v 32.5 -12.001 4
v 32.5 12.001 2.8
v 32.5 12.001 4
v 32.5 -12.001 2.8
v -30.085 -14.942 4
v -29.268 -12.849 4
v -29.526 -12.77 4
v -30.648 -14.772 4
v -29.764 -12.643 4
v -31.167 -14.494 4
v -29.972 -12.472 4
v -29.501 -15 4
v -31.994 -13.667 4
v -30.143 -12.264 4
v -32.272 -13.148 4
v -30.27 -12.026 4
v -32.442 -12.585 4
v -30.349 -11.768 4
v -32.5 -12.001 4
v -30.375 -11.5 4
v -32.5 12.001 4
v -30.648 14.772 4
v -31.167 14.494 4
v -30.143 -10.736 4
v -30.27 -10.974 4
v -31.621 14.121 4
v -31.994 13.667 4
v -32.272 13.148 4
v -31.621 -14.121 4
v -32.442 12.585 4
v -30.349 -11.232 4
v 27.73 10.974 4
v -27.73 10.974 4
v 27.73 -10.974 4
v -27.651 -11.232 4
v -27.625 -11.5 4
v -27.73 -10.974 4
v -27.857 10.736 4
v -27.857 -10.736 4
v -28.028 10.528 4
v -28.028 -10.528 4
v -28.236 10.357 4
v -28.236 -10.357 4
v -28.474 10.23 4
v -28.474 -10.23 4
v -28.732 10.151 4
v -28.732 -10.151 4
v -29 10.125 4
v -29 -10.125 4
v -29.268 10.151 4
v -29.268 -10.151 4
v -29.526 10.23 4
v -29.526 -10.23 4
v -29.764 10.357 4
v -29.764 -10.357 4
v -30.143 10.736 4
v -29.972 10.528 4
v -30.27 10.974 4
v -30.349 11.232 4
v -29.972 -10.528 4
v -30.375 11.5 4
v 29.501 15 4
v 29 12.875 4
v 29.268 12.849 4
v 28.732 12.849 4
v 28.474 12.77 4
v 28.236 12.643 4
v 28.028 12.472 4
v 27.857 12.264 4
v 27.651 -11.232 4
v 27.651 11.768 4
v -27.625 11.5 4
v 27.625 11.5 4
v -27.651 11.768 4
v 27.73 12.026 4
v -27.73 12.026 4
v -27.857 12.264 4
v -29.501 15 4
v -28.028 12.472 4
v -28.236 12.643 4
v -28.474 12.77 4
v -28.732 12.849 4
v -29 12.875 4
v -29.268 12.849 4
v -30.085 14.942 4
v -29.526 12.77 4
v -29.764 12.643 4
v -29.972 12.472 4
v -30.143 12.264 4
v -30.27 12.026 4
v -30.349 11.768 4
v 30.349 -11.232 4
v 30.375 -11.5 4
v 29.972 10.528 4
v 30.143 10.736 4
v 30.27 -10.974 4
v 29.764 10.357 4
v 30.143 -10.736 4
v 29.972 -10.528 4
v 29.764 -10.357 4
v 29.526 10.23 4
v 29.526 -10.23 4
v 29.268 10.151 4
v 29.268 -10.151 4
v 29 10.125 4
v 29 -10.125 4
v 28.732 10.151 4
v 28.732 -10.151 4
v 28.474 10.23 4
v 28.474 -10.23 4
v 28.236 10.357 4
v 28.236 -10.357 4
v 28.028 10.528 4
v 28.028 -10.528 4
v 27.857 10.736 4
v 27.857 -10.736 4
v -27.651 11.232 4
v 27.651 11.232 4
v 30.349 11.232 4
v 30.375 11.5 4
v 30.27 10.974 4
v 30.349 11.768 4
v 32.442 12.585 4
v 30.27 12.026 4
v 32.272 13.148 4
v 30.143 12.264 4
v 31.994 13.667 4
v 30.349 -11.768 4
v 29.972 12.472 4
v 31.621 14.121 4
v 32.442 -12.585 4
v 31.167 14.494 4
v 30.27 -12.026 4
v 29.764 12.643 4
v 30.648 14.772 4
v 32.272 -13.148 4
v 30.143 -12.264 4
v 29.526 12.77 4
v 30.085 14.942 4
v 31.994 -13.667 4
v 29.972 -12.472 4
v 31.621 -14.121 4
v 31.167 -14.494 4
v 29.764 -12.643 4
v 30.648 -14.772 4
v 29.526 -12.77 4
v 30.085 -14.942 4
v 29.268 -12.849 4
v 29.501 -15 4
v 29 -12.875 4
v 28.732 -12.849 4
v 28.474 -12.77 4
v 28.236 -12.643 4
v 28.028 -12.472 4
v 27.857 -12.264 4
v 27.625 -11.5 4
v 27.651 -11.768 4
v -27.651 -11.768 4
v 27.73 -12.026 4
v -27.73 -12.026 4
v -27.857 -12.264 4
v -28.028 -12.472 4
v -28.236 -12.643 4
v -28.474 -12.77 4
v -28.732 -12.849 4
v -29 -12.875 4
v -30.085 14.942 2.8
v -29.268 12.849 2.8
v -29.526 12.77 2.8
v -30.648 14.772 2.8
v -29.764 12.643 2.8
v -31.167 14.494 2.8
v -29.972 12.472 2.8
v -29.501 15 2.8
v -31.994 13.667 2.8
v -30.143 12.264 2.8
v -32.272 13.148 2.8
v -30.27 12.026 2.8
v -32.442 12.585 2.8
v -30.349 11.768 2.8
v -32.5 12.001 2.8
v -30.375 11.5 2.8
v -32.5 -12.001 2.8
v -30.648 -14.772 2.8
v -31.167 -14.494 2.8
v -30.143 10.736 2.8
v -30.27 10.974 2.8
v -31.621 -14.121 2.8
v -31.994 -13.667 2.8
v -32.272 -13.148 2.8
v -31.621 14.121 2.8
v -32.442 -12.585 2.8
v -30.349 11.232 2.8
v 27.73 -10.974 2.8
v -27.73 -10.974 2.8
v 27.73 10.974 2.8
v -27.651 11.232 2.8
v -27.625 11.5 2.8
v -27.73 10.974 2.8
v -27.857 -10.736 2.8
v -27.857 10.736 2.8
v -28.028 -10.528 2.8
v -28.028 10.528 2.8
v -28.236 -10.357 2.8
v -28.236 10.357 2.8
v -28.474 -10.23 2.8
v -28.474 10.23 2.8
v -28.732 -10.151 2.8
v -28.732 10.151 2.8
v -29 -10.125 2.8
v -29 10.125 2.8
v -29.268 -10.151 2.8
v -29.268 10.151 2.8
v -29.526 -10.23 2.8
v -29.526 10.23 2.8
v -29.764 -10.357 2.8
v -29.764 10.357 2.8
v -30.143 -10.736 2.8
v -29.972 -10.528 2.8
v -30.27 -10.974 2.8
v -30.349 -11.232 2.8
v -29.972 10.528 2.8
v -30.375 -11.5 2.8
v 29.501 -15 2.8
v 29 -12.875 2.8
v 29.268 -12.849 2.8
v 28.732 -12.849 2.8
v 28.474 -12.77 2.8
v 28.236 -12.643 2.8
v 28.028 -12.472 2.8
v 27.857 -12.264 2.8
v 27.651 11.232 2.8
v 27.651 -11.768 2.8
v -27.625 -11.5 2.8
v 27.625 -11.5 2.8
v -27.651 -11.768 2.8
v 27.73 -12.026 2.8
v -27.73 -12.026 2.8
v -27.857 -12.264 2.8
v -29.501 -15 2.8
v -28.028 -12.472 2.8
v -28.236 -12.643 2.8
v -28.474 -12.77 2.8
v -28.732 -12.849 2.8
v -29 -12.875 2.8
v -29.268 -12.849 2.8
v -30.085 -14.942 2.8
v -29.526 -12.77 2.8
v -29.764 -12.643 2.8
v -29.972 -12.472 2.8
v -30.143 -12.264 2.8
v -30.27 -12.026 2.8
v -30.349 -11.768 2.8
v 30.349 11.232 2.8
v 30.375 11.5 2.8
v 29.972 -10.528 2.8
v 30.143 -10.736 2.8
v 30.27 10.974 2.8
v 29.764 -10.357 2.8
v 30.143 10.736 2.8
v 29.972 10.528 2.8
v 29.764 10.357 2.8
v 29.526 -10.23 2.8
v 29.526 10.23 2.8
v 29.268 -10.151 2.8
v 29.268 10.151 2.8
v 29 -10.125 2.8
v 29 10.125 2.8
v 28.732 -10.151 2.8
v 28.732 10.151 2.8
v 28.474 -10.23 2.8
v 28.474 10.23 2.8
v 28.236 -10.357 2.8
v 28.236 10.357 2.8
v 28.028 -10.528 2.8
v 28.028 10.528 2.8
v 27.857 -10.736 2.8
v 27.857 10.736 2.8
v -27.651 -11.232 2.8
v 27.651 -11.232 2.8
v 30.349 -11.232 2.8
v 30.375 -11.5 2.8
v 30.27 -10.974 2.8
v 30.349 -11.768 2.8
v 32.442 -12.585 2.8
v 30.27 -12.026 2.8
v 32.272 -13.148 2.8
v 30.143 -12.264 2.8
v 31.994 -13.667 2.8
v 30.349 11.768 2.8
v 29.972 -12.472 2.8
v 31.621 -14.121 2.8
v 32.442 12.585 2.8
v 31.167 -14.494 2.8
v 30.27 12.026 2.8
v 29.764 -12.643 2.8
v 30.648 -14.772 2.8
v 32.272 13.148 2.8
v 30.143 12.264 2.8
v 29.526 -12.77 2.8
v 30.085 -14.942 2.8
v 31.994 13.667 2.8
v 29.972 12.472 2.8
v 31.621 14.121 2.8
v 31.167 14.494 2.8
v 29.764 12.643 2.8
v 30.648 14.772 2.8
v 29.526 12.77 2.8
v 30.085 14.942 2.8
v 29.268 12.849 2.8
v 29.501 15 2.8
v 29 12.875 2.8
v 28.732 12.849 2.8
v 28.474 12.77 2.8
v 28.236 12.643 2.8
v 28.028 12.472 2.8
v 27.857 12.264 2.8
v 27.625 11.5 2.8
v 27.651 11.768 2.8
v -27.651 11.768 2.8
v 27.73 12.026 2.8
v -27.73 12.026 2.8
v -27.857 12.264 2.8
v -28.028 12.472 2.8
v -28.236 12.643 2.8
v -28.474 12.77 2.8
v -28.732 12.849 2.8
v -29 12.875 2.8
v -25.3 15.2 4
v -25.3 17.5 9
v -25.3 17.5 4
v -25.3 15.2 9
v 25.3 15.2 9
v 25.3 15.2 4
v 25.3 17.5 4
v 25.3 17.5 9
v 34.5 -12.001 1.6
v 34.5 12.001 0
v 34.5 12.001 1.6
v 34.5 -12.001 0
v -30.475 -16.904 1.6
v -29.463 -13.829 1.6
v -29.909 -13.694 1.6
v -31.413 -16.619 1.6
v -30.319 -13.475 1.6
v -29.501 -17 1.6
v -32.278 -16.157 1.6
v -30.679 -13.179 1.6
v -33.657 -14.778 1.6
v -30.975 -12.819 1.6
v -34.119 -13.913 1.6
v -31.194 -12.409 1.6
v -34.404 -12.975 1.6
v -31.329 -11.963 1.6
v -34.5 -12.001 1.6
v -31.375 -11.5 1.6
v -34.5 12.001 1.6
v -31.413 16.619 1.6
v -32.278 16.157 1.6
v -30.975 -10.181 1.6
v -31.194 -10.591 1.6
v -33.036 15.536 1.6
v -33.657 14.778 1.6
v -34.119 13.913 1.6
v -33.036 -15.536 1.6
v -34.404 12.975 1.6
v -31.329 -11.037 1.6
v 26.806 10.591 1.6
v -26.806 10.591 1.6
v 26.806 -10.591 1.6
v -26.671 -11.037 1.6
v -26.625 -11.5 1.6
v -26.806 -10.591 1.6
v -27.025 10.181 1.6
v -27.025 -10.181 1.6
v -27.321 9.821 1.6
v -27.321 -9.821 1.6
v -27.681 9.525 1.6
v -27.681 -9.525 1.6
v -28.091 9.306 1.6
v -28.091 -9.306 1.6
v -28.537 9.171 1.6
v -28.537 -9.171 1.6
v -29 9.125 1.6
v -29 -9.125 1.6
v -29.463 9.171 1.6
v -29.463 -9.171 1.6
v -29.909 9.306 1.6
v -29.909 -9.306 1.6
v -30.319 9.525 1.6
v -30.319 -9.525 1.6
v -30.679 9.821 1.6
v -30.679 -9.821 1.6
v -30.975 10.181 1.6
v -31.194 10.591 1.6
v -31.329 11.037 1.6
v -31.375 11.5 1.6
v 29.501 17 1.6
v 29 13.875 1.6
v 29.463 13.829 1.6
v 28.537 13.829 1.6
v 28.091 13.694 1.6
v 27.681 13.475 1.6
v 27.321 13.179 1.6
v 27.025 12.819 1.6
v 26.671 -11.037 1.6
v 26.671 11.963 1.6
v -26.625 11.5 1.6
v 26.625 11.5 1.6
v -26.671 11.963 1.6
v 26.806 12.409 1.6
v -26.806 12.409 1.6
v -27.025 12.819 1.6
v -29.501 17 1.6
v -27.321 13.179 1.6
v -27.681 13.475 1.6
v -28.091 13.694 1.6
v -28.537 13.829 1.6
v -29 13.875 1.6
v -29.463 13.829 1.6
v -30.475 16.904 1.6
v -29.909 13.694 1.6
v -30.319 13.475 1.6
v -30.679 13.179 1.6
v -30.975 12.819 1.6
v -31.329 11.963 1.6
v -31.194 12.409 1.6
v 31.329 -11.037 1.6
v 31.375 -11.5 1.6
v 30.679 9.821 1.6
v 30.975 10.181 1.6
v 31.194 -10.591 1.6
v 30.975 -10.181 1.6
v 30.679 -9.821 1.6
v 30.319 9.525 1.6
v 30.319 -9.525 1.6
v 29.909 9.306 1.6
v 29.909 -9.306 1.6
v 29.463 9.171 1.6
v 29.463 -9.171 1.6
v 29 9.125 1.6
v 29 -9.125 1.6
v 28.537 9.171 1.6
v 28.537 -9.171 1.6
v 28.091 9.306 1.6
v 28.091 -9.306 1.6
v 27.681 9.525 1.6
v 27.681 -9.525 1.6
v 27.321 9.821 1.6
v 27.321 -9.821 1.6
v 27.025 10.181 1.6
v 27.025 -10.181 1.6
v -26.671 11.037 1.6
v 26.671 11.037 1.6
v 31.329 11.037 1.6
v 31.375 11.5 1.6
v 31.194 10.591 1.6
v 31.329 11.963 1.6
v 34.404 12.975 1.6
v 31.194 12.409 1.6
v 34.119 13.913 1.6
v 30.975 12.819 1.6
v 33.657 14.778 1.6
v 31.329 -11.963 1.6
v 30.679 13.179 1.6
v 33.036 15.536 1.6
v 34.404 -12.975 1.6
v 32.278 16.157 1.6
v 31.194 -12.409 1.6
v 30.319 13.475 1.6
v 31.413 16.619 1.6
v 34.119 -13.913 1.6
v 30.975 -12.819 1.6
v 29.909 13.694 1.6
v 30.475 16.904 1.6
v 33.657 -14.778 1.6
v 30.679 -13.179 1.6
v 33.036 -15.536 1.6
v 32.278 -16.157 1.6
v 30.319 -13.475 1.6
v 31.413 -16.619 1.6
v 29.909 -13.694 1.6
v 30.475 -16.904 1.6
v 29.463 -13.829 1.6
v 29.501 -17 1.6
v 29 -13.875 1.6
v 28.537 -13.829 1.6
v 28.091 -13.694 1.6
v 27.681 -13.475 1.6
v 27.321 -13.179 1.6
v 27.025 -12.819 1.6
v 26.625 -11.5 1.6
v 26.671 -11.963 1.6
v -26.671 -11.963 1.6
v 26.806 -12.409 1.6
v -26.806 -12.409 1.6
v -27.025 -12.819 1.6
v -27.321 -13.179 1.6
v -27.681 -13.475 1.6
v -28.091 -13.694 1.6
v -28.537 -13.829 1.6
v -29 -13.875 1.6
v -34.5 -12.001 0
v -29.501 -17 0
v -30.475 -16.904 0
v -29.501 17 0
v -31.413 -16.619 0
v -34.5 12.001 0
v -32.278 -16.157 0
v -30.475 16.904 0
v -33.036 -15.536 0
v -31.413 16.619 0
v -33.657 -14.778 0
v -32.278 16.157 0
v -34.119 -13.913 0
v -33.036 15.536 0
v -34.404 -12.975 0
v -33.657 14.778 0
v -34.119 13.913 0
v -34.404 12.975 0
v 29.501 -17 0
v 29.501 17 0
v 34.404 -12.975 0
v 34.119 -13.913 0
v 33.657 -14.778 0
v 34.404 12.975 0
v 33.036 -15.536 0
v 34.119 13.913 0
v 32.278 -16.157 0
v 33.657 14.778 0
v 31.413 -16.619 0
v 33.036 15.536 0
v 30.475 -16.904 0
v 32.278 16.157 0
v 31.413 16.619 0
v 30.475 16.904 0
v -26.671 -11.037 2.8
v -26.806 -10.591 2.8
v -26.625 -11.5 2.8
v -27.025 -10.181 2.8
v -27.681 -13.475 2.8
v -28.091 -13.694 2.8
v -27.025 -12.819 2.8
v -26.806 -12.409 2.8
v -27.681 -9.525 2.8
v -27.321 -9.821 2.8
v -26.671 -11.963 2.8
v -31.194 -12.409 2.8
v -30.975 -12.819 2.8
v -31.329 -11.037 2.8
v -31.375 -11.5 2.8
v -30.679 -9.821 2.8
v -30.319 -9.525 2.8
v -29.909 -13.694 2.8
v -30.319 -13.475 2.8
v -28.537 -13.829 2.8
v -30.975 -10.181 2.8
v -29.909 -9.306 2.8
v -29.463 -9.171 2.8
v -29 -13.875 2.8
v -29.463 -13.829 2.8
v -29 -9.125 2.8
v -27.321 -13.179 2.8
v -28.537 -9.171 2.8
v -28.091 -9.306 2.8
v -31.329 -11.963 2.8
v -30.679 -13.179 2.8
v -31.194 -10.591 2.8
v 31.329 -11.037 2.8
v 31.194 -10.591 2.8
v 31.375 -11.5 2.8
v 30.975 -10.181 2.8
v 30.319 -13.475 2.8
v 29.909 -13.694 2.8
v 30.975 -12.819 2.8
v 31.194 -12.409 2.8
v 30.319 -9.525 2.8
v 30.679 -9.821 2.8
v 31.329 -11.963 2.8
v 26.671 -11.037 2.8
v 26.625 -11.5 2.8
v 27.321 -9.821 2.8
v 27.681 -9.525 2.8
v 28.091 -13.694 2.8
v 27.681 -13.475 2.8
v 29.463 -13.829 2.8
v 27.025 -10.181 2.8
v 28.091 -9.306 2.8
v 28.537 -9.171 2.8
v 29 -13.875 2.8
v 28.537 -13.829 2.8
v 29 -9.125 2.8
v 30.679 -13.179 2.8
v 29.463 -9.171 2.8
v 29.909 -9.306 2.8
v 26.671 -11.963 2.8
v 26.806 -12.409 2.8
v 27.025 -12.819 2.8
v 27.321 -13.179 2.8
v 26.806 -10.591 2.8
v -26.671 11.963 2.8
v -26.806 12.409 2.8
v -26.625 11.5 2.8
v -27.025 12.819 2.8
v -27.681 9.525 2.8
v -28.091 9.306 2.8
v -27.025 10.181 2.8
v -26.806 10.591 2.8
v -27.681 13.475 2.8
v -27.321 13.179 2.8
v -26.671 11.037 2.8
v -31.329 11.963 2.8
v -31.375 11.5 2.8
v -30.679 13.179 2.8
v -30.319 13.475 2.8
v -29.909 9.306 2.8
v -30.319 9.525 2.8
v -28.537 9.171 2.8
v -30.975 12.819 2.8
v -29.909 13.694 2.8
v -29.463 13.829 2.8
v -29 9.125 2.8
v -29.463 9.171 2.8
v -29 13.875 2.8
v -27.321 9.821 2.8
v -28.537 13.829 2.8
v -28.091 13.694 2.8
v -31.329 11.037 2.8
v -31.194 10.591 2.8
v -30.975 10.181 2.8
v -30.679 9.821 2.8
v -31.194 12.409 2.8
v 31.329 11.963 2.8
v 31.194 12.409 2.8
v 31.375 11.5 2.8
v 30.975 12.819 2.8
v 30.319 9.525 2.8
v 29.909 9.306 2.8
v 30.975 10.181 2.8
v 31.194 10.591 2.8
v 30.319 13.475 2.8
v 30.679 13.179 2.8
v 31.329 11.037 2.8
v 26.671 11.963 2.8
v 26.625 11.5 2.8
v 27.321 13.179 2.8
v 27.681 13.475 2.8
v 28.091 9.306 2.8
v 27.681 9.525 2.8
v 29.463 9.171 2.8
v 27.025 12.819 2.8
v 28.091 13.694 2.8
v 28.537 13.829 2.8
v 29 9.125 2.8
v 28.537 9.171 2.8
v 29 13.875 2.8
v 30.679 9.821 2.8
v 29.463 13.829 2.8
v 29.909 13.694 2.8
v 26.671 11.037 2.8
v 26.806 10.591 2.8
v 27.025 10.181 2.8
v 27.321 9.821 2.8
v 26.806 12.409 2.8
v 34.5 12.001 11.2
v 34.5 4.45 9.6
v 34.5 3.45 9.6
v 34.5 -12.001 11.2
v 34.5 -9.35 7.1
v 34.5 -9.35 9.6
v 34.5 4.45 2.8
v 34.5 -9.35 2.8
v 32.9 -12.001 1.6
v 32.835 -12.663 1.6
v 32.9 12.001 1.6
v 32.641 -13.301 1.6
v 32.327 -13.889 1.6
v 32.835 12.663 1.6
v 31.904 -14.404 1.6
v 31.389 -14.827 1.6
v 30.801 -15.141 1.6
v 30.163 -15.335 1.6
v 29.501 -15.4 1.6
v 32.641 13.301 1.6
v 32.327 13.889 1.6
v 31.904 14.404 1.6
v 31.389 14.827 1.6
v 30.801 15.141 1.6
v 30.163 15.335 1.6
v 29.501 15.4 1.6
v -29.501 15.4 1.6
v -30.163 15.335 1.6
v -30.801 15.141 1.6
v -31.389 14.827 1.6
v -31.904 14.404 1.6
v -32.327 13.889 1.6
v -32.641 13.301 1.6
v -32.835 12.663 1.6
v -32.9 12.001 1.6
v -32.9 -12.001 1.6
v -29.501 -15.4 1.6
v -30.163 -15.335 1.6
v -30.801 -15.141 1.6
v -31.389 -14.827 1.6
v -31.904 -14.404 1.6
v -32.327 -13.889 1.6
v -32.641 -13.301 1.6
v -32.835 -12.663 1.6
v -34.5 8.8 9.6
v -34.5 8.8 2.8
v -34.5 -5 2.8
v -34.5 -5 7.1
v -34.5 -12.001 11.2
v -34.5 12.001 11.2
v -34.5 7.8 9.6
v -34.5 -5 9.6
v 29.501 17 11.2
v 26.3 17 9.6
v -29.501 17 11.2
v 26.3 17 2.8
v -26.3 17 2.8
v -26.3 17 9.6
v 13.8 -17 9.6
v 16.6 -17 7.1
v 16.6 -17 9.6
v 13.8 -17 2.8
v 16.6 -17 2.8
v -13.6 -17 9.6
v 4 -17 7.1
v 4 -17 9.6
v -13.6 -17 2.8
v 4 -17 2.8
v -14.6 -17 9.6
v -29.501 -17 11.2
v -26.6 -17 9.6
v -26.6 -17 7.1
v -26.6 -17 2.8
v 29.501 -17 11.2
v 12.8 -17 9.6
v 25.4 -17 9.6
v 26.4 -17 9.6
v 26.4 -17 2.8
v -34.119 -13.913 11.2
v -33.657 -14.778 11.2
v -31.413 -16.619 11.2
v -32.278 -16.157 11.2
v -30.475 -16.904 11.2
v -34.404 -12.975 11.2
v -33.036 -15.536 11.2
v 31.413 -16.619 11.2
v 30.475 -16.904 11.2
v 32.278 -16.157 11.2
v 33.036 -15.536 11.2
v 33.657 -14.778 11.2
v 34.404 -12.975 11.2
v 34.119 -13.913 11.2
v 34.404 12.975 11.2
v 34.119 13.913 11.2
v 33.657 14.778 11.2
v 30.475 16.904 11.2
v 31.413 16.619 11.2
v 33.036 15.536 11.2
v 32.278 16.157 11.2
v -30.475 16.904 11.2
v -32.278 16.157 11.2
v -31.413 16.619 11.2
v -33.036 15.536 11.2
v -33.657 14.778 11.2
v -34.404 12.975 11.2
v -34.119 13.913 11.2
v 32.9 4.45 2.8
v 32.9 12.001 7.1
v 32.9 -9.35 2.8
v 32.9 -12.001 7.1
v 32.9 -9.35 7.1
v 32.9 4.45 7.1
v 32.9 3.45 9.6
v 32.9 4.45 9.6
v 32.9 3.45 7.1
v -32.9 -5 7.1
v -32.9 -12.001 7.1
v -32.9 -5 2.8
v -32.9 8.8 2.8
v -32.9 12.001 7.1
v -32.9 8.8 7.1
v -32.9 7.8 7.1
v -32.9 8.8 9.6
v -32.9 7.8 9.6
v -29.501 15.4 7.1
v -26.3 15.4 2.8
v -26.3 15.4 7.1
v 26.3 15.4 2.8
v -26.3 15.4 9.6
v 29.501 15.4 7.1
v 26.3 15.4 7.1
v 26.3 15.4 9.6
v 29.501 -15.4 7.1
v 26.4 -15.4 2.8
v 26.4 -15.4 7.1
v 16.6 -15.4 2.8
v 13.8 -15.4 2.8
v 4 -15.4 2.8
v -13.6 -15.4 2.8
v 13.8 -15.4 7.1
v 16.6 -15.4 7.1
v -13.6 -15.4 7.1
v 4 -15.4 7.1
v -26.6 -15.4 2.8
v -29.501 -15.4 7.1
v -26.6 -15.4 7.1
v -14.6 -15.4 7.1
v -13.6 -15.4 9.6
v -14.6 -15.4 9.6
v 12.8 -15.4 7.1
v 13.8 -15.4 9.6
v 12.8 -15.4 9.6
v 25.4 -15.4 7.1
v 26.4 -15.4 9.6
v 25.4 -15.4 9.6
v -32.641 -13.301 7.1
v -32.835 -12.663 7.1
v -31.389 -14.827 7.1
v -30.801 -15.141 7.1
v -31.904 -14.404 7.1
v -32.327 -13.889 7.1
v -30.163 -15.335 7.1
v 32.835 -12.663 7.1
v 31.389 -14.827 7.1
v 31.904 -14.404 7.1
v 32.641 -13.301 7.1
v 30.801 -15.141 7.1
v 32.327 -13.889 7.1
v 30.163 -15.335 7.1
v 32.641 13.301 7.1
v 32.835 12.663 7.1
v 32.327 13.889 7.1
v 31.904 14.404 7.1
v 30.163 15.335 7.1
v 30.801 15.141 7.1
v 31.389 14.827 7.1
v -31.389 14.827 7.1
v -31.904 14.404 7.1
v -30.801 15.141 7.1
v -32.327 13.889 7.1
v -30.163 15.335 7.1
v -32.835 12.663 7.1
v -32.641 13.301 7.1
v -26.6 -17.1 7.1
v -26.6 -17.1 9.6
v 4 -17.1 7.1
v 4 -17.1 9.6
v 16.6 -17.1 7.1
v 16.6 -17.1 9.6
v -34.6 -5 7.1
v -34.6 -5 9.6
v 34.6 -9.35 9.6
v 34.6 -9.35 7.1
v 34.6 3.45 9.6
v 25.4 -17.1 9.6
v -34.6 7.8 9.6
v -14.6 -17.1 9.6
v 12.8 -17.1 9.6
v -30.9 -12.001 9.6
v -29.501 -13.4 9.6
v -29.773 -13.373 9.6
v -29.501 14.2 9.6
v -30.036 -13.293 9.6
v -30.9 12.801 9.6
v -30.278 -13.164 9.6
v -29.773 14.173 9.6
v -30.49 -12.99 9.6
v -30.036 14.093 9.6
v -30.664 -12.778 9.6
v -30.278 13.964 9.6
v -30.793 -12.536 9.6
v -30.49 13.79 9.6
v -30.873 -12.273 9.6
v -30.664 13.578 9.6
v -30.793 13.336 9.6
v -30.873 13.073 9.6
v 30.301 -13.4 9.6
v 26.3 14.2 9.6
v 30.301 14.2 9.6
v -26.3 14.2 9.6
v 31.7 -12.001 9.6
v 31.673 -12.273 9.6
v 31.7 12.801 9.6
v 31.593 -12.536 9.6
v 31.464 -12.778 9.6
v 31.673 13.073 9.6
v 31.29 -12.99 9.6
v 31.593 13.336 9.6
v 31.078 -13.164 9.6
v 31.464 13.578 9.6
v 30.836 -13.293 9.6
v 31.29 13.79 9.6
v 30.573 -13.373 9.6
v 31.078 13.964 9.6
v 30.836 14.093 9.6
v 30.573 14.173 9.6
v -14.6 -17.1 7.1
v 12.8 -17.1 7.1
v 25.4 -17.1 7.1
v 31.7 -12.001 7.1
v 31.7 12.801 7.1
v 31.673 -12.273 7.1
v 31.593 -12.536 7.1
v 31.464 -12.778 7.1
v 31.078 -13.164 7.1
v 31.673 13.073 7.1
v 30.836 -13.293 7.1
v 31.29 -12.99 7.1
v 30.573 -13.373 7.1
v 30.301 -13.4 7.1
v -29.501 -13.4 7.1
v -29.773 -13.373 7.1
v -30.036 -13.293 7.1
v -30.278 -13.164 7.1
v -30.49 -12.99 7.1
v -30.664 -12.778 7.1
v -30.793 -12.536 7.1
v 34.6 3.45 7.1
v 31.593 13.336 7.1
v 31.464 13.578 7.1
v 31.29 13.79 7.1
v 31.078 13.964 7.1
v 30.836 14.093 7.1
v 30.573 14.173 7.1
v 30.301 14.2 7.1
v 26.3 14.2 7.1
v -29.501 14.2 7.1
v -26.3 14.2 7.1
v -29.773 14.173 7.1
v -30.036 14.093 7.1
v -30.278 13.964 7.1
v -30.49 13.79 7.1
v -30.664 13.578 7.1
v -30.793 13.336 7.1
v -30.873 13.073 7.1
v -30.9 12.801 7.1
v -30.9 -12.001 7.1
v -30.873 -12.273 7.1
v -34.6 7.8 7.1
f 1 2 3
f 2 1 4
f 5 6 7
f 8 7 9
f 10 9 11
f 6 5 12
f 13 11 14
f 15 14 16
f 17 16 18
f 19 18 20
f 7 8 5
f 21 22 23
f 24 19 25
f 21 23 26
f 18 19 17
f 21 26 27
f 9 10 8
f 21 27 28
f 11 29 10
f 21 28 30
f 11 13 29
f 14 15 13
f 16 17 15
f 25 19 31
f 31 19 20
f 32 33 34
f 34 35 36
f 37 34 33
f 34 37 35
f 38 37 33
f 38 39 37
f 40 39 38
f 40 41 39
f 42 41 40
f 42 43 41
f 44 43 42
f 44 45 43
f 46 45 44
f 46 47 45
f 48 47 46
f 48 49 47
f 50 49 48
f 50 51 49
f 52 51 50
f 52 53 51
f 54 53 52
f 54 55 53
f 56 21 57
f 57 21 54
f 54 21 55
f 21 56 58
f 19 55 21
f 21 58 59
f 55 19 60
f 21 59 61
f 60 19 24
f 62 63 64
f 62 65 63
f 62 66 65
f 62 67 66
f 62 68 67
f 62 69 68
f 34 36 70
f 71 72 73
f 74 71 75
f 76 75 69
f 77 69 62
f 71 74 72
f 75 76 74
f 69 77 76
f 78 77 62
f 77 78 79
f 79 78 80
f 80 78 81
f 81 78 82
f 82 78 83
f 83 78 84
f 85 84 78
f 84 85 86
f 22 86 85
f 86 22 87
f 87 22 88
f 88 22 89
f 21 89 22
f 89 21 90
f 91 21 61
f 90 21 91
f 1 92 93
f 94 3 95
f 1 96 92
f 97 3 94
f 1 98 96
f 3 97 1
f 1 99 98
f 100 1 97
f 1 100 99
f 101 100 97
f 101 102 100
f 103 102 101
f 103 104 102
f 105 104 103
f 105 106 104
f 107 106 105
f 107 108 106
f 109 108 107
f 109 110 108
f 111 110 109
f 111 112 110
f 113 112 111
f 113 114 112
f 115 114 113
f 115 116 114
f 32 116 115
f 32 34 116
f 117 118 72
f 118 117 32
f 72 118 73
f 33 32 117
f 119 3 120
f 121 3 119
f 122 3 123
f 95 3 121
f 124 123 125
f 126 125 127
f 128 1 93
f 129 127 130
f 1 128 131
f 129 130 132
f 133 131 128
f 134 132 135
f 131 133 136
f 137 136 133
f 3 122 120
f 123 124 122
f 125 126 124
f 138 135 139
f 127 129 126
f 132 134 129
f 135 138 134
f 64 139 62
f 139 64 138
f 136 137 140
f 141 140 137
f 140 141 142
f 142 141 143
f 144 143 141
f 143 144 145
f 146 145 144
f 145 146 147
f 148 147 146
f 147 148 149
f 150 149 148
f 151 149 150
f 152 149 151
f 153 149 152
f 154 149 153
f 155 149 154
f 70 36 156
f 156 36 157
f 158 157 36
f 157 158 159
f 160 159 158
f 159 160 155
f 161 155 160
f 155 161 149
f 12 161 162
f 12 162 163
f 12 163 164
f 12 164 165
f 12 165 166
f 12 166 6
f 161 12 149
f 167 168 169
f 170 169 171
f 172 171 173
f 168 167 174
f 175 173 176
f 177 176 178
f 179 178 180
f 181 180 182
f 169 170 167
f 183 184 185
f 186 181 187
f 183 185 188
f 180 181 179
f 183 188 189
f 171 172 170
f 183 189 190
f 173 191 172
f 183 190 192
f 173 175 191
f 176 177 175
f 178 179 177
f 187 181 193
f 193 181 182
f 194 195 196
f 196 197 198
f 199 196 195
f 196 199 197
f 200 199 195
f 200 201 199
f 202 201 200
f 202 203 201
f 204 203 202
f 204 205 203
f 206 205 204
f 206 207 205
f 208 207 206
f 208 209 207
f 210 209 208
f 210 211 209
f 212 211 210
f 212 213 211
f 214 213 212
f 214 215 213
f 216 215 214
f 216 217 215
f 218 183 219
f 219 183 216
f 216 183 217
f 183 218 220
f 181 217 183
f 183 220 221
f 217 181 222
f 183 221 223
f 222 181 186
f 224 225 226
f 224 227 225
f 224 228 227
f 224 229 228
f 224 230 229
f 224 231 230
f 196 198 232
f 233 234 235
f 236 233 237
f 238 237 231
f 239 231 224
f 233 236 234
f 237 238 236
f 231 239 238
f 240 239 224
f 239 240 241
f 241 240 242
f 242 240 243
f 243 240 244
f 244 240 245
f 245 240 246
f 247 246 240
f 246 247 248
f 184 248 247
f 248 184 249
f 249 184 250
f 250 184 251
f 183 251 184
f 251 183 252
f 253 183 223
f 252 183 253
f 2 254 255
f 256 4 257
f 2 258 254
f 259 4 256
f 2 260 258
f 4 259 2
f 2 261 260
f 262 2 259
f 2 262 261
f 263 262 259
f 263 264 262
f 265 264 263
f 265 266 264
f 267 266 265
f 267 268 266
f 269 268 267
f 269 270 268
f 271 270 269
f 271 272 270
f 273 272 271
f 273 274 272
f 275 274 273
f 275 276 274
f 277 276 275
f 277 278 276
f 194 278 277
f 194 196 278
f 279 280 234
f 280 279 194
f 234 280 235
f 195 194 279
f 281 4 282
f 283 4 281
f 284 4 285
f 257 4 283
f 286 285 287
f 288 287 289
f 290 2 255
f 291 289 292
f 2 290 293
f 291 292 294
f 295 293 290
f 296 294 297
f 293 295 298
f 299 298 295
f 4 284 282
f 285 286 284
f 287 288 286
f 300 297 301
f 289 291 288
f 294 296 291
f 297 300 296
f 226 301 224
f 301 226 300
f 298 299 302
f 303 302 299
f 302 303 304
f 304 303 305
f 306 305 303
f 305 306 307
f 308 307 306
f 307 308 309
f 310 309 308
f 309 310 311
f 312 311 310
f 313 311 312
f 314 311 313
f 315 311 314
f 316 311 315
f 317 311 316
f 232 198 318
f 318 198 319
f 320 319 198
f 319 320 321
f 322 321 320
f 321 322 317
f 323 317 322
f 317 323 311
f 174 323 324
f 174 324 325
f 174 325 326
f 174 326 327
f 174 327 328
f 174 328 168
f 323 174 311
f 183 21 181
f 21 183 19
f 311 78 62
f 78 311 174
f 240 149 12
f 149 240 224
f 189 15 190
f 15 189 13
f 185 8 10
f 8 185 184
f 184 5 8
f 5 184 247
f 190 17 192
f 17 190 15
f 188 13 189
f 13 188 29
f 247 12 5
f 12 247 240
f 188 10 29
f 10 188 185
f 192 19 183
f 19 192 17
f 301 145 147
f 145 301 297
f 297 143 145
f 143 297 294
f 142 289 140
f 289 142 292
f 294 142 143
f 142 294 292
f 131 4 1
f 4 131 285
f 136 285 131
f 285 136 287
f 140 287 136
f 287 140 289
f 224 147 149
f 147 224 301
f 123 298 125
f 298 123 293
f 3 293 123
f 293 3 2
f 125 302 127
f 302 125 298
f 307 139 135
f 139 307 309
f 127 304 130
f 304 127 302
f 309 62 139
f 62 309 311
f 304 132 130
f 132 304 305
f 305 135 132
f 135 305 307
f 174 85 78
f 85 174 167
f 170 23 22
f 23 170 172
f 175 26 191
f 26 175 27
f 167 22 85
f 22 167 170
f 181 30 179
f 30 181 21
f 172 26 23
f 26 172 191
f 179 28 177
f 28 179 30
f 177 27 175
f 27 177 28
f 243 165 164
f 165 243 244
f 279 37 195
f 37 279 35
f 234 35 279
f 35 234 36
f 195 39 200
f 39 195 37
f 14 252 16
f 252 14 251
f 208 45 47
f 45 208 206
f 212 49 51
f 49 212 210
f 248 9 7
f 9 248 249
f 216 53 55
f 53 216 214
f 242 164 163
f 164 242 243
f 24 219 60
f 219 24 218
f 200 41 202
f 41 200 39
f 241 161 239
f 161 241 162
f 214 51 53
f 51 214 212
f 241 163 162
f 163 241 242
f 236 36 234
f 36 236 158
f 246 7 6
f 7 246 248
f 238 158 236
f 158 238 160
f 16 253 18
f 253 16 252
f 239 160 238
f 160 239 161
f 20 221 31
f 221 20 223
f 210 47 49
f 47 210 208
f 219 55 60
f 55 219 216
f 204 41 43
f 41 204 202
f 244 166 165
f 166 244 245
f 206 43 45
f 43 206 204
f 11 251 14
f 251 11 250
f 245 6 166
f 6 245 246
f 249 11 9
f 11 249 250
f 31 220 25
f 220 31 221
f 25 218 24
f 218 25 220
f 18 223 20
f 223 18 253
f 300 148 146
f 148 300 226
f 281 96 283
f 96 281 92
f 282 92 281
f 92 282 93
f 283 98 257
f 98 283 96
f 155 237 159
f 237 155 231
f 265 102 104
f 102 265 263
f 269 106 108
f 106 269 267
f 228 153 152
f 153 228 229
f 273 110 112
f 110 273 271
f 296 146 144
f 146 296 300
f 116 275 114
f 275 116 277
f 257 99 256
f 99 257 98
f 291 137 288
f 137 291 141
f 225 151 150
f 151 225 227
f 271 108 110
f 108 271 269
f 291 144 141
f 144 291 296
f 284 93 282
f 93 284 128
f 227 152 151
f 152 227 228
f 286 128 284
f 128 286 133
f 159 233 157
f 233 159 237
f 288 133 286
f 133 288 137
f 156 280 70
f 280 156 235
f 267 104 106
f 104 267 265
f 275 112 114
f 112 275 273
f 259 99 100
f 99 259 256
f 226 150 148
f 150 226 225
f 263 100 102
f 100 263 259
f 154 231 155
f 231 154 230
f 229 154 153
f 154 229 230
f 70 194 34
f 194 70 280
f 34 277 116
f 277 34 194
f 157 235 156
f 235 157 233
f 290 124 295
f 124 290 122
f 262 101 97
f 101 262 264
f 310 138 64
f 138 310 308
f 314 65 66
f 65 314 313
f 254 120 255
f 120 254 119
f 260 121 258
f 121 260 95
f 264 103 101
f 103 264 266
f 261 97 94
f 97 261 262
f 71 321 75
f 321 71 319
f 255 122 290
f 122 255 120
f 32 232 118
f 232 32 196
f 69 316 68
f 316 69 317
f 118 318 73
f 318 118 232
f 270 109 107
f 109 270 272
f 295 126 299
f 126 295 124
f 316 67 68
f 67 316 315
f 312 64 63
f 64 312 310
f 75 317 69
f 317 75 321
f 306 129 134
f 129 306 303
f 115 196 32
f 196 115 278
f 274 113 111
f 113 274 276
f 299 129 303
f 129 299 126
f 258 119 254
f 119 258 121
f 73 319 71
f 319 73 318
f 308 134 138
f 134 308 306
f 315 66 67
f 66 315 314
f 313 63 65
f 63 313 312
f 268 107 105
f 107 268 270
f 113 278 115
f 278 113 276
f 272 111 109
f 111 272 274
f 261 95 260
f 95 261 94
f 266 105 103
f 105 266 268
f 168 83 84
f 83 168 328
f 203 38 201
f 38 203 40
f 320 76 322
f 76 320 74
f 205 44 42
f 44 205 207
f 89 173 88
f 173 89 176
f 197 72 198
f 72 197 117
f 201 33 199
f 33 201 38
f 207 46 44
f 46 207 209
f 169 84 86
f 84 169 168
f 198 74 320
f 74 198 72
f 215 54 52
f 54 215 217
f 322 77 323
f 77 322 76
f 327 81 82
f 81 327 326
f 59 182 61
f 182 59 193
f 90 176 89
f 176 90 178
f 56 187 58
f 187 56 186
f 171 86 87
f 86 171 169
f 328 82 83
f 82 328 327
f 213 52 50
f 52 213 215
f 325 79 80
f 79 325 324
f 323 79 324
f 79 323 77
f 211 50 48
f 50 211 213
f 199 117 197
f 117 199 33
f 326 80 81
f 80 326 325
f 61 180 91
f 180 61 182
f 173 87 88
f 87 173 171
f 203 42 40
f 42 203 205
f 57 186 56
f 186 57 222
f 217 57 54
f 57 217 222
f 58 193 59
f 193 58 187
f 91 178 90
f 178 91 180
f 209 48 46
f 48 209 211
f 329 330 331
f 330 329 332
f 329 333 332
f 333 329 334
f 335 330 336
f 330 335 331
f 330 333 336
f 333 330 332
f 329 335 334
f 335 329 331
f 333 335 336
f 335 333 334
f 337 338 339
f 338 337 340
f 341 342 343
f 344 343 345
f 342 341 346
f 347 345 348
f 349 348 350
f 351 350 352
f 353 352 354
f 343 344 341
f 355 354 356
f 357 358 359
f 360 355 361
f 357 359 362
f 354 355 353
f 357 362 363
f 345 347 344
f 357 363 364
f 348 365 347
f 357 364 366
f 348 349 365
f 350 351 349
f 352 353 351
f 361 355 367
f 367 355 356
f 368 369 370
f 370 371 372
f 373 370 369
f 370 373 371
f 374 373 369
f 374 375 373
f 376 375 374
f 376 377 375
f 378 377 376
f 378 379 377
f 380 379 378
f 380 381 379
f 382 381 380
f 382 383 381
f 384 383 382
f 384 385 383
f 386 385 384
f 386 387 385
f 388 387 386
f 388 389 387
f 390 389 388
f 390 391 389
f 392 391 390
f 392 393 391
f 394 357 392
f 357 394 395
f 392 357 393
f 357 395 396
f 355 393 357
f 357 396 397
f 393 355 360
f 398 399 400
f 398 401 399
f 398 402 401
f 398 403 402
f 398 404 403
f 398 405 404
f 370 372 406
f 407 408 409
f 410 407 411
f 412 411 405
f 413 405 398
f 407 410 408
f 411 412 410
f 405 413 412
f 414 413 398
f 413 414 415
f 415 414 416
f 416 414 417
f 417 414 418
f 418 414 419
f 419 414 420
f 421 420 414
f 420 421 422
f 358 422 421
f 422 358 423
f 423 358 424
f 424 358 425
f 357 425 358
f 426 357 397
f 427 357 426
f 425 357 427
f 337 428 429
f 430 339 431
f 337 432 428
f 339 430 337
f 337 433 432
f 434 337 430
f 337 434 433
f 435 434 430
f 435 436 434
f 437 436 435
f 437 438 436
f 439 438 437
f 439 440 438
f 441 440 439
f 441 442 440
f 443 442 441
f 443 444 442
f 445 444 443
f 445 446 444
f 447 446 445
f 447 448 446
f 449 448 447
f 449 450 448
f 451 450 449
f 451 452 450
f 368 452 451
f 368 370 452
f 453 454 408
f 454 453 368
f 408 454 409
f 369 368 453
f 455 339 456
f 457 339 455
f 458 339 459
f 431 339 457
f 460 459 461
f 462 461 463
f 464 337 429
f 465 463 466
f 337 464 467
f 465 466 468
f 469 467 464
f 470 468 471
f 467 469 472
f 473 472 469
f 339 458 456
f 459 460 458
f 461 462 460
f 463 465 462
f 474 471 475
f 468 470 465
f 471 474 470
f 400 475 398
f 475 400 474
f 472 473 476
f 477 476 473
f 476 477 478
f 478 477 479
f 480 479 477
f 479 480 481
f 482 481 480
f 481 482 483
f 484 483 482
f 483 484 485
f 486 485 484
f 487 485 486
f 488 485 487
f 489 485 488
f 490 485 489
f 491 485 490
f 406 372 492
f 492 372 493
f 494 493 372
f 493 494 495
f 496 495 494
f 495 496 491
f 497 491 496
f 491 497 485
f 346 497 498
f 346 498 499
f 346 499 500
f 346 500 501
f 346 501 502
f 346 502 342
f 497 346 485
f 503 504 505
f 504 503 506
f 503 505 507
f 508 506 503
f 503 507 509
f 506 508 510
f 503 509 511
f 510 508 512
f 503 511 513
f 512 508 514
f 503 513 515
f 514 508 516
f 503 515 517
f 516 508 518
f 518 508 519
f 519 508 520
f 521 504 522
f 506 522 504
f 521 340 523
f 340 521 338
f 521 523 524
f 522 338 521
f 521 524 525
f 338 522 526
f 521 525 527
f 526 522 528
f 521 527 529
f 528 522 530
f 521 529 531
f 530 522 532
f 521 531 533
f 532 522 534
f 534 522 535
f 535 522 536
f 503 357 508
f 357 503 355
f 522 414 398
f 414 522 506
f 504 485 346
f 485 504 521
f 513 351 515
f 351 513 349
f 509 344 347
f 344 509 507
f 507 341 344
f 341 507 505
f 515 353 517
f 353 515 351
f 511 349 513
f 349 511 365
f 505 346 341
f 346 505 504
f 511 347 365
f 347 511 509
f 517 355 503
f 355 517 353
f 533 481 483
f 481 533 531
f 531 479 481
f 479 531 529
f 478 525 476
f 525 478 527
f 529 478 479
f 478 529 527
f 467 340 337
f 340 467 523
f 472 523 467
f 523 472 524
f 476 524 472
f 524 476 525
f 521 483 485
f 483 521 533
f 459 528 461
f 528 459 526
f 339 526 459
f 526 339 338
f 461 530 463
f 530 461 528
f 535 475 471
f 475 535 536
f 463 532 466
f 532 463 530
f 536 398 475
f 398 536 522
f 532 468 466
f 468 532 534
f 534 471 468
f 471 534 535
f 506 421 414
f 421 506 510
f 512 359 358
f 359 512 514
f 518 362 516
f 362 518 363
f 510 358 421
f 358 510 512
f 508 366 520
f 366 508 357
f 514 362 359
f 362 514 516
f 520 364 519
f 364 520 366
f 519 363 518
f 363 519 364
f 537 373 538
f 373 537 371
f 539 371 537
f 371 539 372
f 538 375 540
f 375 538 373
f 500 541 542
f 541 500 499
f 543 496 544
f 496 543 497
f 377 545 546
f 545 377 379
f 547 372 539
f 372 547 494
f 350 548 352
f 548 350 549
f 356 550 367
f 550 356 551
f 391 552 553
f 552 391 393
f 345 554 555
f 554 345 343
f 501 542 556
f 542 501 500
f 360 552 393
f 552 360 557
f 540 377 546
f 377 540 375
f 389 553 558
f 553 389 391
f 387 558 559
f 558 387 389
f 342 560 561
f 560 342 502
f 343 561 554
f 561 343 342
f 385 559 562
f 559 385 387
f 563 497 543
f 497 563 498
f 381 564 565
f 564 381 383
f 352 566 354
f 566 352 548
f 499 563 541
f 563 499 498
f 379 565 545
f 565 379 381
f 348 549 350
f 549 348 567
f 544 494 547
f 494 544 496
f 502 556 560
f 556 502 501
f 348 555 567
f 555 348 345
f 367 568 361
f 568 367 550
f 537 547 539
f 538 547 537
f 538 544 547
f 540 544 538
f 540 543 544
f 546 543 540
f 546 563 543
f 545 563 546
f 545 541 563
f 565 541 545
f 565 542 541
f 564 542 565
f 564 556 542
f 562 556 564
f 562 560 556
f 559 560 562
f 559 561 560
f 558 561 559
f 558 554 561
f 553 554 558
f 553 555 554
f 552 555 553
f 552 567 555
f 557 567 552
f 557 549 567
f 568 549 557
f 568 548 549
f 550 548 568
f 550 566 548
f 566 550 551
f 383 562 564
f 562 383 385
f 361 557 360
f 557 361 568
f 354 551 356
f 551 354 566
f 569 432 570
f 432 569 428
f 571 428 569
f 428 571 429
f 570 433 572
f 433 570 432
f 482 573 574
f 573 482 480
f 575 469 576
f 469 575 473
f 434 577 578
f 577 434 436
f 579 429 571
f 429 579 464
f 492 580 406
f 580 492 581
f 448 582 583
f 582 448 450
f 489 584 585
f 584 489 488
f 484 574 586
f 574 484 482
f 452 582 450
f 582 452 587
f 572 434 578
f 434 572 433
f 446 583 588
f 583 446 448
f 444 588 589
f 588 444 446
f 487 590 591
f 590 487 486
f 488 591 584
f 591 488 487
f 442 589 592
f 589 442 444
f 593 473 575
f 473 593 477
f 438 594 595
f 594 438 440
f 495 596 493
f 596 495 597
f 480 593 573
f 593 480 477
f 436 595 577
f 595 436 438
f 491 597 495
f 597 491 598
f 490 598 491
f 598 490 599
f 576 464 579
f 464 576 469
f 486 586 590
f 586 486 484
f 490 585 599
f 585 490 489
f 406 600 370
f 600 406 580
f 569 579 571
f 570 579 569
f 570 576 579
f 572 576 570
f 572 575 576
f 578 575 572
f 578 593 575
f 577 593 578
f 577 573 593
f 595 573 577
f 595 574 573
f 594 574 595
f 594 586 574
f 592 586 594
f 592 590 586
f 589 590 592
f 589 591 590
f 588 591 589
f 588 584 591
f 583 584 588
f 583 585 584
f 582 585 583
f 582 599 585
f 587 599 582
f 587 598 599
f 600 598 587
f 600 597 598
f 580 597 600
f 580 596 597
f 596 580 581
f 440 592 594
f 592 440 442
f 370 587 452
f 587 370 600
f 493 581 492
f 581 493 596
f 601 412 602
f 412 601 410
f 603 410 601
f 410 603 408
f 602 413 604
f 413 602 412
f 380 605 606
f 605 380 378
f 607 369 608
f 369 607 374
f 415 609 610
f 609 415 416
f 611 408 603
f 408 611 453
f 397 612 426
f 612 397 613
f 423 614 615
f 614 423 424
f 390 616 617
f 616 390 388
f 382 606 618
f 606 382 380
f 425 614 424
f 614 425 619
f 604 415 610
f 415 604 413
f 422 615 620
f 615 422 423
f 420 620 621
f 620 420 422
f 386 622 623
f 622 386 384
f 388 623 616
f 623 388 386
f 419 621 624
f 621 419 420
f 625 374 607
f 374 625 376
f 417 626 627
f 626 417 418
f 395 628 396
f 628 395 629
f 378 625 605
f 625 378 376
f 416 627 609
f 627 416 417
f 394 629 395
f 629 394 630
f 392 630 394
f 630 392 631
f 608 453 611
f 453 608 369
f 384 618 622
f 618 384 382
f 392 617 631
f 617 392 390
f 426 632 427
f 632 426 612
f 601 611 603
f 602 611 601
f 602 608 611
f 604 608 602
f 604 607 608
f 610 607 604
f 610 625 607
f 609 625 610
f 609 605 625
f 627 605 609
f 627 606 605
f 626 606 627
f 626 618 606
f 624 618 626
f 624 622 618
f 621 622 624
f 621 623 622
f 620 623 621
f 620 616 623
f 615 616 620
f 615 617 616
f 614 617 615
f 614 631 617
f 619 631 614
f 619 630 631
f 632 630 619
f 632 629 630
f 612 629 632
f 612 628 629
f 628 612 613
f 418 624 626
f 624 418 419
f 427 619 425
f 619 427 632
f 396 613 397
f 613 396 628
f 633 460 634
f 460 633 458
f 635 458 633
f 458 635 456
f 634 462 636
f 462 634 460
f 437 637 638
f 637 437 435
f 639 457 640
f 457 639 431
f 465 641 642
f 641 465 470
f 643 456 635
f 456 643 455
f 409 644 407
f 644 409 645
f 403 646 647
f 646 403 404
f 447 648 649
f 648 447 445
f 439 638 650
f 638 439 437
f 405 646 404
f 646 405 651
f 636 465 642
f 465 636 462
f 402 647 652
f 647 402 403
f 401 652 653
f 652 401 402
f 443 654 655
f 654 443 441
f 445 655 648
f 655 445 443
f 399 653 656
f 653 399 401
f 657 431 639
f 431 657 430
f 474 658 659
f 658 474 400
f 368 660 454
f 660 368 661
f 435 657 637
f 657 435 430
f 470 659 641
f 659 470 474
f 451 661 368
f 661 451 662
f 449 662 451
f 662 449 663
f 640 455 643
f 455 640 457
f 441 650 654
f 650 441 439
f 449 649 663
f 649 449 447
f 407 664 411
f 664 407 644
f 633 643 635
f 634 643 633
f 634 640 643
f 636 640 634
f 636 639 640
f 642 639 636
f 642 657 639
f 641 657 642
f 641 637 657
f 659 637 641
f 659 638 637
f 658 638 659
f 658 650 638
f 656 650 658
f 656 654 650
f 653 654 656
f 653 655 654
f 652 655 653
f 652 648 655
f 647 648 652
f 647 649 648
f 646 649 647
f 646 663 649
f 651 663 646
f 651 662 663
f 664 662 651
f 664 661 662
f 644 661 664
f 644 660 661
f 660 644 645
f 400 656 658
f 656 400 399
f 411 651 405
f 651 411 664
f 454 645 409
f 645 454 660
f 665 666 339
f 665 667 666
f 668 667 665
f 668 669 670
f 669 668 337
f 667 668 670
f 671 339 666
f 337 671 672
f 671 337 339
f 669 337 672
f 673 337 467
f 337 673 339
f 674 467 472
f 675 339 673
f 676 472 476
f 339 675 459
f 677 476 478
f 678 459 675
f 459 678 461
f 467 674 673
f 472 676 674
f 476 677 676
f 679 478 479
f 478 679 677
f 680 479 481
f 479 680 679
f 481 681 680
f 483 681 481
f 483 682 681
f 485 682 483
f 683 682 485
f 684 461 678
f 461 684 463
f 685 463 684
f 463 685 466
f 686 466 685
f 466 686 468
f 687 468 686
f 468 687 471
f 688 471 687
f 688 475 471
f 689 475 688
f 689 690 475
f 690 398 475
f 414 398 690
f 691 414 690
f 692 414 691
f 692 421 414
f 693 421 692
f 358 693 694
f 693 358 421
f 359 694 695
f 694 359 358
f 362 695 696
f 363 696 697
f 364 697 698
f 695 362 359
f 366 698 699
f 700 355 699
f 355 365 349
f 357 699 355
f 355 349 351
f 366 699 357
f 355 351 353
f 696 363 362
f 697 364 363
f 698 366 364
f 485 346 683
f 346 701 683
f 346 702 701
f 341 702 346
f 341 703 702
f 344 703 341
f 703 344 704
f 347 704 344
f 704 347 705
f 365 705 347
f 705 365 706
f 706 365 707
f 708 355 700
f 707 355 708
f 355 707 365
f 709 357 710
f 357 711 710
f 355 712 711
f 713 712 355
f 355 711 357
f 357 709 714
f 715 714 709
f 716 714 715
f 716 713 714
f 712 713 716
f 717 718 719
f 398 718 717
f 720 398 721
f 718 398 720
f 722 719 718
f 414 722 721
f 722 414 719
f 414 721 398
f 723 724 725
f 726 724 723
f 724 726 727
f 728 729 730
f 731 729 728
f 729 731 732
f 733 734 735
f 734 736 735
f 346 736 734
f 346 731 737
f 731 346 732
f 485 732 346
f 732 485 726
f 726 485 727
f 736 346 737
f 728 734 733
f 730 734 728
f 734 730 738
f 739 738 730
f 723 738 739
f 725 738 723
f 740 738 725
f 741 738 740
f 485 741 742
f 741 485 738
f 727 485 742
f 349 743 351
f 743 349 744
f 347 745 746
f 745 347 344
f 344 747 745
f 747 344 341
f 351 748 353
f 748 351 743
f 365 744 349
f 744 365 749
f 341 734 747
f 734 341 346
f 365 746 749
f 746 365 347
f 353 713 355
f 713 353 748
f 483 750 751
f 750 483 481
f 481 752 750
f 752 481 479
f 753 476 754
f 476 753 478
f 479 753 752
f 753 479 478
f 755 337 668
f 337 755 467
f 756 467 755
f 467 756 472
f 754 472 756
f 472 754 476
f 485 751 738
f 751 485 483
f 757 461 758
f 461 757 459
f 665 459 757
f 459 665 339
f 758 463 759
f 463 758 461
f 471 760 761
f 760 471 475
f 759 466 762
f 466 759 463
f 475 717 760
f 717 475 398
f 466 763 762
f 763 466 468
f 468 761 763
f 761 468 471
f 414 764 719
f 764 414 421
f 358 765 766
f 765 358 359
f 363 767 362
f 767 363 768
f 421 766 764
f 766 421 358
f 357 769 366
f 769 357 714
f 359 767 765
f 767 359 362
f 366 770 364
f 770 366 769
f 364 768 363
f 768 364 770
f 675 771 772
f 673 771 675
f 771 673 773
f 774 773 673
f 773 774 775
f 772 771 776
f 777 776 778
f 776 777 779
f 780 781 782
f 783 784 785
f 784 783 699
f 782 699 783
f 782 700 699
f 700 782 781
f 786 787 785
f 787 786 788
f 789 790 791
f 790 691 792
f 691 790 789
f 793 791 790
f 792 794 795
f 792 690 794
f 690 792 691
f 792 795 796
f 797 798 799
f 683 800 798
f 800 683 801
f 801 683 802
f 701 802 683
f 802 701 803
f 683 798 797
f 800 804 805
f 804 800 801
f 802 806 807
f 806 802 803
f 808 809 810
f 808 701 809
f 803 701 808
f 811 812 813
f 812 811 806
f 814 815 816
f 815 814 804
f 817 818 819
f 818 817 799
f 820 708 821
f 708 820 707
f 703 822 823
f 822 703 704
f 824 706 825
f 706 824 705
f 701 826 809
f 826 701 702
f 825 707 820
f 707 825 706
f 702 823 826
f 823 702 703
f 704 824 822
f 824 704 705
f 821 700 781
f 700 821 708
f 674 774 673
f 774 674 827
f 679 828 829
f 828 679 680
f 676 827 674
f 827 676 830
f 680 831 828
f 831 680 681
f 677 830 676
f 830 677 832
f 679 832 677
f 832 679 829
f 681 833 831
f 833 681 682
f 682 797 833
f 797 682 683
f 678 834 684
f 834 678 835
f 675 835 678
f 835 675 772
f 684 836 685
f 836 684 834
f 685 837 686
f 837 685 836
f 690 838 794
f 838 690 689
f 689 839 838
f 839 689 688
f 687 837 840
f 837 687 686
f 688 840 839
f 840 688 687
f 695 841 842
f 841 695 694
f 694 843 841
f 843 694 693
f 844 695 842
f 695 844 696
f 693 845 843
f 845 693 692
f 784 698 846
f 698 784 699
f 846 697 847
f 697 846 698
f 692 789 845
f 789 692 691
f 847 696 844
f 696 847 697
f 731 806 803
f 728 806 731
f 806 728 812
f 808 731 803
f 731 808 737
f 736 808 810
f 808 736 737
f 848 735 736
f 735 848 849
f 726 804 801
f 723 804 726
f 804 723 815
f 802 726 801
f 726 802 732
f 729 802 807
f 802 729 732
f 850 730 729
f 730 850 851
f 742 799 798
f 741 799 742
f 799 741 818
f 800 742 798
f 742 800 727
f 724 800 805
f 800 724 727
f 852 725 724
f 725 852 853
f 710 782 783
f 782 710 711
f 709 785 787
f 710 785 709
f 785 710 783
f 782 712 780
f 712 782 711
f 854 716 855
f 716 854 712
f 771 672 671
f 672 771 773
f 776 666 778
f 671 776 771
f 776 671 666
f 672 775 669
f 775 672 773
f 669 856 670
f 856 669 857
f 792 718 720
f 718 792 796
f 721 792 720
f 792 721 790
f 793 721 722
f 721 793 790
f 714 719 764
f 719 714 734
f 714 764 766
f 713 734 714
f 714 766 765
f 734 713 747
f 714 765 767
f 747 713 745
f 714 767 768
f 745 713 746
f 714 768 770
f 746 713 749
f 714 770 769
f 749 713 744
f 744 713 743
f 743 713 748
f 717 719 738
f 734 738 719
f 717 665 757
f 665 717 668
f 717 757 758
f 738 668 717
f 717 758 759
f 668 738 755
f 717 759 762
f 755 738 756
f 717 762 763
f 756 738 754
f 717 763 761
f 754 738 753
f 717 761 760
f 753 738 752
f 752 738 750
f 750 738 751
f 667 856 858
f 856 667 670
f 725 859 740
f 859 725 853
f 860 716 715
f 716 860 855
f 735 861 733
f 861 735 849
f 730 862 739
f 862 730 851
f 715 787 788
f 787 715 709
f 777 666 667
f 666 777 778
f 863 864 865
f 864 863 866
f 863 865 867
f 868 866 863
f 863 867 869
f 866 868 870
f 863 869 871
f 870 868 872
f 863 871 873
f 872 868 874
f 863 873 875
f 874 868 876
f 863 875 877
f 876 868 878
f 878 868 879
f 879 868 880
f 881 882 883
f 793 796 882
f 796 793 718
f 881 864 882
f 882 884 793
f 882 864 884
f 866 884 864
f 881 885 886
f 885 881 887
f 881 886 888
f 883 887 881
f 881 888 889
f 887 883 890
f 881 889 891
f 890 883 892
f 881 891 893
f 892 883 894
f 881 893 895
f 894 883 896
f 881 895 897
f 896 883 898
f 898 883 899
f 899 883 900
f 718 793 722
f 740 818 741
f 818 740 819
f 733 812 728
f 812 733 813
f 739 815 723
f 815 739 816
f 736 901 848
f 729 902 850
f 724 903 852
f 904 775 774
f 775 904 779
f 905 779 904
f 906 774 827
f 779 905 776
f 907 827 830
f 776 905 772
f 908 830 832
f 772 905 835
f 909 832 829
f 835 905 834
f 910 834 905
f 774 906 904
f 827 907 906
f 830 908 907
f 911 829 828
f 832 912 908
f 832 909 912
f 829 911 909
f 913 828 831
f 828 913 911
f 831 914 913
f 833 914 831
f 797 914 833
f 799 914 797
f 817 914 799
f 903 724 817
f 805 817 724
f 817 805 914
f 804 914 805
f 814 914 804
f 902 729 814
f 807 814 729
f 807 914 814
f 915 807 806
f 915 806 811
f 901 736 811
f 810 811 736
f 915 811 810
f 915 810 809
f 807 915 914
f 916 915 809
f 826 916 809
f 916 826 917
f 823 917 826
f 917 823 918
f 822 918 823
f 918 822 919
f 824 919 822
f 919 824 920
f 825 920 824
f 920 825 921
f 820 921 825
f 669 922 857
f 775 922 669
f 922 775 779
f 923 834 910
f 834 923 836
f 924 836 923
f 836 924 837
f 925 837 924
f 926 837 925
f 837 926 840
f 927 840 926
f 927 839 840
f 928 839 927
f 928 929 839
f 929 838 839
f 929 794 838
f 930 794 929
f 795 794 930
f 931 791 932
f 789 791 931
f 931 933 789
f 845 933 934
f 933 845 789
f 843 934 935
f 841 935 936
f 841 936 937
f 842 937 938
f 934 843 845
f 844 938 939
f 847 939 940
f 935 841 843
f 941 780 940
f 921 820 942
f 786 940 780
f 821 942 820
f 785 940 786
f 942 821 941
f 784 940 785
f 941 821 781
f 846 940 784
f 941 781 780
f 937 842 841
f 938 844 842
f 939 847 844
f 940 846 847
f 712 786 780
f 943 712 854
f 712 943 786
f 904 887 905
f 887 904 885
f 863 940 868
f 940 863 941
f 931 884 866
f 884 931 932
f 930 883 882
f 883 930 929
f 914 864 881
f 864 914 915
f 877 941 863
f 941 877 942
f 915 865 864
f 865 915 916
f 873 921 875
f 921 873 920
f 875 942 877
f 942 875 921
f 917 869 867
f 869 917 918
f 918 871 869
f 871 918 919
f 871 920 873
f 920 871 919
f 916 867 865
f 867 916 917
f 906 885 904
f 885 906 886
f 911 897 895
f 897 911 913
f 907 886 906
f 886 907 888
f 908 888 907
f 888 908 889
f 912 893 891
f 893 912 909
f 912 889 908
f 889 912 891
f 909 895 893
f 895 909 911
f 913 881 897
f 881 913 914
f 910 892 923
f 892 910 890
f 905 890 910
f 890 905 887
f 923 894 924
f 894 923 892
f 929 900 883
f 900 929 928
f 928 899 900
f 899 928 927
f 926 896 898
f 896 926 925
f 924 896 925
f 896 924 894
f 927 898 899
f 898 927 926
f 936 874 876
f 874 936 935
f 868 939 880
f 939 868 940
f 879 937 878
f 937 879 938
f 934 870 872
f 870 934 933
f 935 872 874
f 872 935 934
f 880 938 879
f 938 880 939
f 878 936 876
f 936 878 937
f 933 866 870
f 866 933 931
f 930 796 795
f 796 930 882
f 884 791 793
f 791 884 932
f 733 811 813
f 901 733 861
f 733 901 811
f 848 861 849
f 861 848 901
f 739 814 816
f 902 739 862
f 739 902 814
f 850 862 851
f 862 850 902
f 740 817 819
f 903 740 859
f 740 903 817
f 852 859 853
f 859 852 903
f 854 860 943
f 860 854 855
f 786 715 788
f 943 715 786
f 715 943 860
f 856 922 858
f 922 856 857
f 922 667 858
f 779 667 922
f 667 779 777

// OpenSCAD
$fn = 32;

pzCirBrdDim = [65,30,1.2]; // pi zero circuit board dim
pzStdOffOffset = 3.5; // pi zero stand off hole center offset
pzStdOffDia = 2.75; // pi zero stand off hole diameter
pzCnrRad = 3.0;

wallThickness = 1.6;   // Case wall thickness
bottomThickness = 1.6; // Case botton thickness
topThickness = 1.6;    // Case top thickness
standoffHeight = 1.2;  // Case standoff height
gap = 0.4;             // Gap between pi and inside walls
wallHeight = 8;       // Height off wall not counting bottom

connectorDim = [50.6,5,2.3]; // Connector for pins

// Cutouts
hdmiCenterX = 12.4 + wallThickness + gap;
hdmiWidth = 11.0 + 2;
usbCenterX = 41.4 + wallThickness + gap;
usbWidth = 7.8 + 2;
pwrCenterX = 54.0 + wallThickness + gap;
pwrWidth = 7.8 + 2;
sdCenterY = 16.9 + wallThickness + gap;
sdWidth = 11.8 + 2;
camCenterY = pzCirBrdDim[1]/2 + wallThickness + gap;
camWidth = 16.7 + 2;
pinCenterX = pzCirBrdDim[0]/2 + wallThickness + gap;
pinWidth = 50.6 + 2;

drawRpi();
color("red") drawBottom();
color("yellow") drawWalls();
color("blue") drawTop();

// Calculated globals
bottomDim = [
  pzCirBrdDim[0] + wallThickness * 2 + gap * 2,
  pzCirBrdDim[1] + wallThickness * 2 + gap * 2,
  bottomThickness
];

cornerRadius = pzCnrRad + gap + wallThickness;

module top(center = true) {
  d = bottomDim;
  t = center ? [-d[0]/2,-d[1]/2,0] : [0,0,0];
  
  lipHeight = 2.5;
  lip = [d[0]-wallThickness*2, d[1]-wallThickness*2, lipHeight];
  thk = wallThickness;
  
  translate(t) {
    // The top plate
    rcube(d, r=cornerRadius);
    
    // The bits that extend into the cutouts
    hdmi = [hdmiWidth-1, wallThickness+0.2, lipHeight];
    usb = [usbWidth-1, wallThickness+0.2, lipHeight];
    pwr = usb;
    sd = [wallThickness+0.2, sdWidth-1, lipHeight];
    
    z = -lipHeight;
    translate([hdmiCenterX-hdmiWidth/2, -0.1, z]) cube(hdmi);
    translate([usbCenterX-usbWidth/2, -0.1, z]) cube(usb);
    translate([pwrCenterX-pwrWidth/2, -0.1, z]) cube(pwr);
    translate([-0.1, sdCenterY-sdWidth/2, z]) cube(sd);
    translate([bottomDim[0]-wallThickness-0.1, camCenterY-  camWidth/2, z]) cube(sd);
    
    // The inner rim
    translate([wallThickness, wallThickness, -lip[2]]) {
      difference() {
        rcube(lip, r=pzCnrRad+gap);
        translate([2, 2, -0.01]) 
          rcube([lip[0]-2*thk, lip[1]-2*thk, lip[2]+.02], r=  pzCnrRad+gap-2);
        translate([pinCenterX-pinWidth/2-thk, d[1]-8, -.01])
          cube([pinWidth, 5, lip[2]+.02]);
      }
    }
  }
}

module bottom(center = true) {
  d = bottomDim;
  t = center ? [-d[0]/2,-d[1]/2,0] : [0,0,0];
  
  translate(t) {
    rcube(d, r=cornerRadius);
    so = pzStdOffOffset + wallThickness + gap;
    translate([so, so, bottomThickness]) standOff();
    translate([bottomDim[0]-so, so, bottomThickness]) standOff();
    translate([so, bottomDim[1]-so, bottomThickness]) standOff();
    translate([bottomDim[0]-so, bottomDim[1]-so, bottomThickness]) standOff();
  }
}

module standOff() {
  cylinder(d=pzStdOffDia+2, h=standoffHeight);
  //cylinder(d=2.5, h=standoffHeight+pzCirBrdDim[2]*1.5);
}

module walls(center = true) {
  d = [bottomDim[0], bottomDim[1], wallHeight];
  t = center ? [-d[0]/2,-d[1]/2,0] : [0,0,0];
  
  translate(t) {
    difference() {
      rcube(d, r=cornerRadius);
      translate([wallThickness, wallThickness, -.01]) 
        rcube([d[0]-wallThickness*2, d[1]-wallThickness*2, d[2]+.02], r=cornerRadius-wallThickness);
      wallCutouts();
    }
    //color("red") wallCutouts();
  }
}

module wallCutouts() {
  hdmi = [hdmiWidth, wallThickness+0.2, wallHeight];
  usb = [usbWidth, wallThickness+0.2, wallHeight];
  pwr = usb;
  sd = [wallThickness+0.2, sdWidth, wallHeight];
  pin = [pinWidth, wallThickness+0.2, wallHeight];
  z = standoffHeight;
  
  translate([hdmiCenterX-hdmiWidth/2, -0.1, z]) cube(hdmi);
  translate([usbCenterX-usbWidth/2, -0.1, z]) cube(usb);
  translate([pwrCenterX-pwrWidth/2, -0.1, z]) cube(pwr);
  translate([-0.1, sdCenterY-sdWidth/2, z]) cube(sd);
  translate([bottomDim[0]-wallThickness-0.1, camCenterY-camWidth/2, z]) cube(sd);
  translate([pinCenterX-pinWidth/2, bottomDim[1]-wallThickness-0.1, z]) cube(pin);
}

module rcube(v, r=3) {
  union() {
    difference() {
      cube(v);
      translate([-.001,-.001,-.01]) cube([r,r,v[2]+.02]);
      translate([v[0]-r+.001,-.001,-.01]) cube([r,r,v[2]+.02]);
      translate([v[0]-r+.001,v[1]-r+.001,-.01]) cube([r,r,v[2]+.02]);
      translate([-.001,v[1]-r+.001,-.01]) cube([r,r,v[2]+.02]);
    }
    translate([r,r,0]) cylinder(r=r,h=v[2]);
    translate([v[0]-r,r,0]) cylinder(r=r,h=v[2]);
    translate([v[0]-r,v[1]-r,0]) cylinder(r=r,h=v[2]);
    translate([r,v[1]-r,0]) cylinder(r=r,h=v[2]);
  }
}

module rpi_zero(center=true) {
  d = pzCirBrdDim;
  t = center ? [-d[0]/2,-d[1]/2,0] : [0,0,0];
  off = pzStdOffOffset;
  r = pzStdOffDia/2;
  translate(t) {
    color("green") difference() {
      rcube(d);
      translate([off,off,-.01]) cylinder(r=r,h=d[2]+.02);
      translate([d[0]-off,off,-.01]) cylinder(r=r,h=d[2]+.02);
      translate([d[0]-off,d[1]-off,-.01]) cylinder(r=r,h=d[2]+.02);
      translate([off,d[1]-off,-.01]) cylinder(r=r,h=d[2]+.02);
    }
    translate([0,d[1]+connectorDim[1]/2,0]) pins();
  }
}

module pins() {
  d = pzCirBrdDim;
  cd = connectorDim;
    color("gray") 
      translate([(d[0]-cd[0])/2,0,d[2]]) 
        rotate([90,0,0])
          cube(cd);
}

module drawRpi() {
  z = bottomThickness + standoffHeight;
  translate([0,0,z]) rpi_zero();
}

module drawBottom() {
  bottom();
}

module drawWalls() {
  translate([0,0,bottomThickness]) walls();
};

module drawTop() {
  translate([0,0,bottomThickness+wallHeight]) top();
};
